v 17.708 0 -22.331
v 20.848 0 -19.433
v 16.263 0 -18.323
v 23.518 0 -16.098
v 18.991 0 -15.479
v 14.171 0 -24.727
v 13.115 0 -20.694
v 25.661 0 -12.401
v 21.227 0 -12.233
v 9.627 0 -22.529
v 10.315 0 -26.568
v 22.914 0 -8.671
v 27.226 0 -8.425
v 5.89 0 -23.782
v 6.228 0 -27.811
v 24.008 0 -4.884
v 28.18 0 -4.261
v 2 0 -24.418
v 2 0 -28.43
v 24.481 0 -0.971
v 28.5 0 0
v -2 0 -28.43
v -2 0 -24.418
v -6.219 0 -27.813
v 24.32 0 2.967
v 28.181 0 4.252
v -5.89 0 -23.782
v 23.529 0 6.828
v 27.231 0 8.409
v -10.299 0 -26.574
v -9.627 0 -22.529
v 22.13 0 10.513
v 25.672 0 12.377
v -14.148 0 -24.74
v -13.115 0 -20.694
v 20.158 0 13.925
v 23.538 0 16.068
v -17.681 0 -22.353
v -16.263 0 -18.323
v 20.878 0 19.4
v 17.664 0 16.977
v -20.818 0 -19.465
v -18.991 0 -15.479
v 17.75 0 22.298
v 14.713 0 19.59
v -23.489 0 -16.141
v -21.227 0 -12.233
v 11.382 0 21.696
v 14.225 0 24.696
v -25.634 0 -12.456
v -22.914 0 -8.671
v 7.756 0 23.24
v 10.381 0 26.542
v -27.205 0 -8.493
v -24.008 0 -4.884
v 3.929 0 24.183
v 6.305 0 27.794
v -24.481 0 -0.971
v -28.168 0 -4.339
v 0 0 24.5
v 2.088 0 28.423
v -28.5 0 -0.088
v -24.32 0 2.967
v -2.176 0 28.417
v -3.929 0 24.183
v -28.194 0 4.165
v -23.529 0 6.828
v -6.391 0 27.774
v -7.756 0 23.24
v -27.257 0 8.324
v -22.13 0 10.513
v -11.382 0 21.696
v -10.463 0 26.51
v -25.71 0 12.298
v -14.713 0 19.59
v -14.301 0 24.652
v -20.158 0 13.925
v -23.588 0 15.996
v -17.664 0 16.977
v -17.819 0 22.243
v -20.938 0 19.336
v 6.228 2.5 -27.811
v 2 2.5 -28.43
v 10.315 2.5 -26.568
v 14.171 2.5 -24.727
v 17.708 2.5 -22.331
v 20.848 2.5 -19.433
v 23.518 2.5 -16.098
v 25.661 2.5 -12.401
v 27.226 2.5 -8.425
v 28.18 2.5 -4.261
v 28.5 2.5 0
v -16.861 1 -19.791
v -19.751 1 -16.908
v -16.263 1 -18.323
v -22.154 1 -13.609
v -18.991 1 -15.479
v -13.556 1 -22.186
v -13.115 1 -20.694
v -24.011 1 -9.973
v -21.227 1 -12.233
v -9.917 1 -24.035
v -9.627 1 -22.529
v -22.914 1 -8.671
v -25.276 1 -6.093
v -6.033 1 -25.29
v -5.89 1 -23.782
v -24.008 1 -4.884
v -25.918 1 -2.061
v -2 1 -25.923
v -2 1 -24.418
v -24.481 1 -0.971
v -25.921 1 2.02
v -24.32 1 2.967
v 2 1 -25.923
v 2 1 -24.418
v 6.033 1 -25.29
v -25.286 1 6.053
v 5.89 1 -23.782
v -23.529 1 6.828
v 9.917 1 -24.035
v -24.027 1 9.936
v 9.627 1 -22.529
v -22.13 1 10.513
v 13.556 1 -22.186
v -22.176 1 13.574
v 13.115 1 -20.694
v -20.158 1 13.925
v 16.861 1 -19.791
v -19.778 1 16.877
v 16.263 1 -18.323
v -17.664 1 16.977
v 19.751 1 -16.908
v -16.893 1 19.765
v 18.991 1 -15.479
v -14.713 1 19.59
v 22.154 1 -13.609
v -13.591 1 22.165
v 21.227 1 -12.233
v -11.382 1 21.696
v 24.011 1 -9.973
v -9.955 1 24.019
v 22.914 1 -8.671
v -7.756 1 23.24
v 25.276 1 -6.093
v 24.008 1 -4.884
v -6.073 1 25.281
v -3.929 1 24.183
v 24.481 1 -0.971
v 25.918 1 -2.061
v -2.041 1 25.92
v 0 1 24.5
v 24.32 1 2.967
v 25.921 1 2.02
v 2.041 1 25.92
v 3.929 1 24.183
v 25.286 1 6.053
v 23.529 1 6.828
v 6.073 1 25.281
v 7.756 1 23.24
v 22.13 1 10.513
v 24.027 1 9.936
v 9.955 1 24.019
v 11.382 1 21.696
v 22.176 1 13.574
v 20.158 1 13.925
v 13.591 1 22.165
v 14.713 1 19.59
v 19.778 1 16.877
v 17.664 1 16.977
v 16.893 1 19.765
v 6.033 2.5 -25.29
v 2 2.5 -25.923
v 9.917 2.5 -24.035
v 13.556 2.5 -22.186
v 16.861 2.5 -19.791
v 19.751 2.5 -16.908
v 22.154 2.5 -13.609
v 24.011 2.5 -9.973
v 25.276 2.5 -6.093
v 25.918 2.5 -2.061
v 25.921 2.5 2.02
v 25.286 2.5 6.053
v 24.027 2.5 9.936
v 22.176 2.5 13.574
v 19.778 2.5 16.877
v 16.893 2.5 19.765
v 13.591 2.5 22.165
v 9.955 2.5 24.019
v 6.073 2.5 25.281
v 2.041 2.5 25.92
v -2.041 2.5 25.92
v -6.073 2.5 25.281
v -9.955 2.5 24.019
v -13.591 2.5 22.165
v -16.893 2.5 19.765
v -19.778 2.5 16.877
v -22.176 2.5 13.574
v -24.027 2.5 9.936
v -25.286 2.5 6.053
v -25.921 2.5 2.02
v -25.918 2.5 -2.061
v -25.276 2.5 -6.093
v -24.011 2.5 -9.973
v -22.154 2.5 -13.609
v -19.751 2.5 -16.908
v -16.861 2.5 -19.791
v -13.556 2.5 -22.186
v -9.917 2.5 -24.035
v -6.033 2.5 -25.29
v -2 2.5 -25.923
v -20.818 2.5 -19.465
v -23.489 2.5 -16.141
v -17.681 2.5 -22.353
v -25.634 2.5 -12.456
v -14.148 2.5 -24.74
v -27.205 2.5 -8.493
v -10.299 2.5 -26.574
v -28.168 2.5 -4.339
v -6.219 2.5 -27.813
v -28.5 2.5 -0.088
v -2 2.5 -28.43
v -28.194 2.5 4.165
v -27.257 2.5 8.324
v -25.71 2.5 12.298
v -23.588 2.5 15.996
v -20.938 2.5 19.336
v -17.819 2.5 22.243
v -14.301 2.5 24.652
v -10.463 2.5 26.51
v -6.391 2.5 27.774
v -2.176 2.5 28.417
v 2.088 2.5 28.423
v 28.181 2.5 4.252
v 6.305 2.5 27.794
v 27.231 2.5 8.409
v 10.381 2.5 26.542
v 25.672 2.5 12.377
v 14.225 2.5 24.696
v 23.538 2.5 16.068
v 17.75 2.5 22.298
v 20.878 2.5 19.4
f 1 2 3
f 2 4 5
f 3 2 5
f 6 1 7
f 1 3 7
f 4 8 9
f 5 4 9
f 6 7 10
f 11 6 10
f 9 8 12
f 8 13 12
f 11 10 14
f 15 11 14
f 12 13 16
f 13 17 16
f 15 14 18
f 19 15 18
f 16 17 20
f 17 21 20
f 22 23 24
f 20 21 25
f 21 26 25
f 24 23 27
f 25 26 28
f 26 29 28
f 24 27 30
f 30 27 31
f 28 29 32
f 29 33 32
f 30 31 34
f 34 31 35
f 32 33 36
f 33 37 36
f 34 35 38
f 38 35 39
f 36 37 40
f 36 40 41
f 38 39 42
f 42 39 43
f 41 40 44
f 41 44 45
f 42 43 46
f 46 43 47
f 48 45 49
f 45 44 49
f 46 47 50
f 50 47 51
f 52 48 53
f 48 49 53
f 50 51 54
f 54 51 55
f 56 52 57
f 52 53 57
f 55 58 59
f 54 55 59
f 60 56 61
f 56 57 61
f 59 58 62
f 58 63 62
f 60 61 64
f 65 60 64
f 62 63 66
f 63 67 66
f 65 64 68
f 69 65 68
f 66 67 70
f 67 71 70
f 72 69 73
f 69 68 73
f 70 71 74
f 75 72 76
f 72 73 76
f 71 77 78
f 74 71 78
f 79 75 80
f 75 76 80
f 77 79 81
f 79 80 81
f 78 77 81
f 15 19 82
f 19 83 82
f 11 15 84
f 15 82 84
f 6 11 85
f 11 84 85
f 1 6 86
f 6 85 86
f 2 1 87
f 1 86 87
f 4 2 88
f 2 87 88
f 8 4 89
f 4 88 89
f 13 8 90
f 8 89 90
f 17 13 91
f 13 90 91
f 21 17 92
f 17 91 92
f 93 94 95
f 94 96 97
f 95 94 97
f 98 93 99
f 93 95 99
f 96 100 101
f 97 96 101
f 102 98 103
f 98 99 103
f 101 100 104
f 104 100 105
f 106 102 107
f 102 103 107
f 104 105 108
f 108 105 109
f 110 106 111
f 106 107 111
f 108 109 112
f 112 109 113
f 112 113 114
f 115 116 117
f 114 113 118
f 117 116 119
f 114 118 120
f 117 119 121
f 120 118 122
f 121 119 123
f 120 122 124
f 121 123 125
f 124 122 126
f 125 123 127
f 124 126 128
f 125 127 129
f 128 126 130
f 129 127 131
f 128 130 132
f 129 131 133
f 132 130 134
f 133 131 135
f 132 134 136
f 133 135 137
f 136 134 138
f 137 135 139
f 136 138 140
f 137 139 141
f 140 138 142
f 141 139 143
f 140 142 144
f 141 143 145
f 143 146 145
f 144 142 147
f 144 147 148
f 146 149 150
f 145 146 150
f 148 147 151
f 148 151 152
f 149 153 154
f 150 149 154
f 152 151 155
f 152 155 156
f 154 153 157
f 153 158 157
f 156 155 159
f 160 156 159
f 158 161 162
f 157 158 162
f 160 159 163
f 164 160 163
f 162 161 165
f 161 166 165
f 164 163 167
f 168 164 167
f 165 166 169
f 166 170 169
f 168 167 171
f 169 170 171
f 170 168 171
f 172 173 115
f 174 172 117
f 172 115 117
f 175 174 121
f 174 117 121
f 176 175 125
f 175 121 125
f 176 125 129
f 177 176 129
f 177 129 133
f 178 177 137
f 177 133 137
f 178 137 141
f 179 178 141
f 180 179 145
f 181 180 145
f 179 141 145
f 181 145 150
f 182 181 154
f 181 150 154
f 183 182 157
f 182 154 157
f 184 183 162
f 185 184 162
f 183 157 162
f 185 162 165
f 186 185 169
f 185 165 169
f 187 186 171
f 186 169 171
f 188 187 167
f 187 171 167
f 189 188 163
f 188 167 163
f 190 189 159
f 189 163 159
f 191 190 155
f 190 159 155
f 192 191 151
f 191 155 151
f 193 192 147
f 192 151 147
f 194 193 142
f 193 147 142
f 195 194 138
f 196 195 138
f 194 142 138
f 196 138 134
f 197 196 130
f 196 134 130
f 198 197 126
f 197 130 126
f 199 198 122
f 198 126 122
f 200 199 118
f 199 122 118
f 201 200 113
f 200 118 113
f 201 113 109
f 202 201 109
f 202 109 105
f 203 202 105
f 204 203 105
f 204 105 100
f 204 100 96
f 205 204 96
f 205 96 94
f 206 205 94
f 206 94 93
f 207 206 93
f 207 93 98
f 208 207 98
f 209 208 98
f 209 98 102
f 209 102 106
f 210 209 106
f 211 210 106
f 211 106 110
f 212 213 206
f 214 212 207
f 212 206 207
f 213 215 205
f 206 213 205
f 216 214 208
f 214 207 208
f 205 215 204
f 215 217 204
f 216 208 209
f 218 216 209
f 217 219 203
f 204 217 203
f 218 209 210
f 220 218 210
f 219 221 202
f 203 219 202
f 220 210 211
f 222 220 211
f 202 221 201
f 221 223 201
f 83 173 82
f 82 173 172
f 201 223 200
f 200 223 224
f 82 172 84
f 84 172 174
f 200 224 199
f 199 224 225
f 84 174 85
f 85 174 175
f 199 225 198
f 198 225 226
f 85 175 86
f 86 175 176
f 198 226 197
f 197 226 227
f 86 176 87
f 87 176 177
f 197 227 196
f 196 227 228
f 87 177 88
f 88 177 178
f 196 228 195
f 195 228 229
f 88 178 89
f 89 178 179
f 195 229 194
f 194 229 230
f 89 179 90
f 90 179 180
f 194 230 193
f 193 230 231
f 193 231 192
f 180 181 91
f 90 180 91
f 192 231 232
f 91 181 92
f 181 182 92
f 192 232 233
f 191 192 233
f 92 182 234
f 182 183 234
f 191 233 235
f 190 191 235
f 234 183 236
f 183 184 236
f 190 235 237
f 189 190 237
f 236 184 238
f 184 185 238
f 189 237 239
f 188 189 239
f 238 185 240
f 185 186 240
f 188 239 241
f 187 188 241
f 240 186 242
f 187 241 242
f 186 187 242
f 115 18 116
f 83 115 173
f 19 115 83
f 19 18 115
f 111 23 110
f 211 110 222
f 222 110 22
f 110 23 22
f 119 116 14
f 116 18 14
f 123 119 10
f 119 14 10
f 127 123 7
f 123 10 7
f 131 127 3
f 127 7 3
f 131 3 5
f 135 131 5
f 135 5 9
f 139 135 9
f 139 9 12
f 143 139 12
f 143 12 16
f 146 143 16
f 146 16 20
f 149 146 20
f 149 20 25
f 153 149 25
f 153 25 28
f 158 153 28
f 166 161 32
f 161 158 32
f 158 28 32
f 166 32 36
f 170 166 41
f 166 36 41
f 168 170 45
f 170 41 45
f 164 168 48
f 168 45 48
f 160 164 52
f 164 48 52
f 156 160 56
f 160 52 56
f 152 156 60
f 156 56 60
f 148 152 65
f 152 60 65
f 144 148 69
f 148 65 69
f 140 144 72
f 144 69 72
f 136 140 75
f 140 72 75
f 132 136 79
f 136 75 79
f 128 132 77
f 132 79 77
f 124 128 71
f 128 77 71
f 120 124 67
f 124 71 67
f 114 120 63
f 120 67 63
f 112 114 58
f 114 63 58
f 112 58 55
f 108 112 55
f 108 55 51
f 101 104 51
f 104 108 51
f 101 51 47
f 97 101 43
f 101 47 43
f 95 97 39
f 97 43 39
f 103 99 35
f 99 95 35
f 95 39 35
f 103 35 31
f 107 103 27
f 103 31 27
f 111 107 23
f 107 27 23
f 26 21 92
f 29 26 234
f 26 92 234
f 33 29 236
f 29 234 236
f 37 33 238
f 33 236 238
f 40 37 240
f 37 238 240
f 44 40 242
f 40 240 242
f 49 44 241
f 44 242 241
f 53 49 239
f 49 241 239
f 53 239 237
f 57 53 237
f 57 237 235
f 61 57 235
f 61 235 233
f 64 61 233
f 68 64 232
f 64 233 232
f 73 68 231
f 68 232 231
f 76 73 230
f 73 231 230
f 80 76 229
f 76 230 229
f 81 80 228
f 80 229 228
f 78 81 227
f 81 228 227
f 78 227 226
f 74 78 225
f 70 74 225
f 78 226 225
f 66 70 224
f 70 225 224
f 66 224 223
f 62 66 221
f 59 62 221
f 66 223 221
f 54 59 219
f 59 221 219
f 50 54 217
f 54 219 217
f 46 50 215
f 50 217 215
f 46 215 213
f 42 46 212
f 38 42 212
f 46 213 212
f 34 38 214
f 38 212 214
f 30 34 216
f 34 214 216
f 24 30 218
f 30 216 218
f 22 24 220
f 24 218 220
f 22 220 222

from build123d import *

# Parameters (mm, degrees)
SKETCH_2_W          = 4
SKETCH_2_H          = 52
CUT_EXTRUDE_5_DEPTH = 3.5


with BuildPart() as part:
    # Эскиз1 → Повернуть1 (revolve)
    with BuildSketch(Plane.XY):
        Polygon((24.5, 0), (28.5, 0), (28.5, 2.5), (26, 2.5), (26, 1), (24.5, 1), align=None)
    revolve(axis=Axis((0, 27.258538146, 0), (0, -1, 0)))

    # Эскиз2 → Вырез-Вытянуть5 (cut, through all)
    with BuildSketch(Plane(origin=(0, 0, 0), x_dir=(1, 0, 0), z_dir=(0, 1, 0))):
        with Locations((0, 26)):
            Rectangle(SKETCH_2_W, SKETCH_2_H)
    extrude(amount=CUT_EXTRUDE_5_DEPTH, mode=Mode.SUBTRACT)


solid = part.part
